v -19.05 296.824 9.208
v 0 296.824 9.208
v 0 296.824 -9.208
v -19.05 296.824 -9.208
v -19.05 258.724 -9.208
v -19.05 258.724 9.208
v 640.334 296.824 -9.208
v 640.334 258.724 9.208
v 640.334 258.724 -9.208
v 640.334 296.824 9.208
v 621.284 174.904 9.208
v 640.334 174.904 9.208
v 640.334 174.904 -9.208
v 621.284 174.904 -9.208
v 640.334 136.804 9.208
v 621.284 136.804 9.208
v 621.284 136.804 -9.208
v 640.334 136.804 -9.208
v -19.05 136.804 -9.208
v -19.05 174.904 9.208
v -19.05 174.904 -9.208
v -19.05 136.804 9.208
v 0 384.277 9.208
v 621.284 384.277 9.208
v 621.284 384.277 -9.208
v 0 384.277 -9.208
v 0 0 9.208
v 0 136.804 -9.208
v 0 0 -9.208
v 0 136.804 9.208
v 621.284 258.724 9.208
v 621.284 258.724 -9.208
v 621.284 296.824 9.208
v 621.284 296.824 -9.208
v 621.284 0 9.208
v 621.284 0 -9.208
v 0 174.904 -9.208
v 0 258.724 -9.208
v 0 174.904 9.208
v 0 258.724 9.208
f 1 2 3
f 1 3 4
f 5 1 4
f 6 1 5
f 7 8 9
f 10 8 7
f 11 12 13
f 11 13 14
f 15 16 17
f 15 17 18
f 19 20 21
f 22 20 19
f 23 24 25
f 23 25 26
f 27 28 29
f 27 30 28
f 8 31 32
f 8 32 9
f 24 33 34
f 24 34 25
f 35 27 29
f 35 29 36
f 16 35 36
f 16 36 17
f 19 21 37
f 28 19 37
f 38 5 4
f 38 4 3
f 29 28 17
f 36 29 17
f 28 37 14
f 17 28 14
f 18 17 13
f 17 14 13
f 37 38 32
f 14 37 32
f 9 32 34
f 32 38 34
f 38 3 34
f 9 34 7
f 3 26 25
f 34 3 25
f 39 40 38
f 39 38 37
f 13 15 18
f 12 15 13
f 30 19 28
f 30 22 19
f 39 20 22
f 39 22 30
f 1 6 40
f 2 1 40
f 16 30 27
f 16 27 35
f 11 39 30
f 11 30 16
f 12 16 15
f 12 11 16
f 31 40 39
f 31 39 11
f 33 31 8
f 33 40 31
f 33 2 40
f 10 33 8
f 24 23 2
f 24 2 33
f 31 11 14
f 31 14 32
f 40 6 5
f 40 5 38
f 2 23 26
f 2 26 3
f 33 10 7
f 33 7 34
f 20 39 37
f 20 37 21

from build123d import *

# Parameters (mm, degrees)
F1_DEPTH = 9.2075


with BuildPart() as f1:
    # F0 (on Top) → F1 (new body, symmetric)
    with BuildSketch(Plane.XY):
        Polygon((0, 136.8044), (0, 0), (621.284, 0), (621.284, 136.8044), (640.334, 136.8044), (640.334, 174.9044), (621.284, 174.9044), (621.284, 258.7244), (640.334, 258.7244), (640.334, 296.8244), (621.284, 296.8244), (621.284, 384.2766), (0, 384.2766), (0, 296.8244), (-19.05, 296.8244), (-19.05, 258.7244), (0, 258.7244), (0, 174.9044), (-19.05, 174.9044), (-19.05, 136.8044), align=None)
    extrude(amount=F1_DEPTH, both=True)


solid = f1.part
